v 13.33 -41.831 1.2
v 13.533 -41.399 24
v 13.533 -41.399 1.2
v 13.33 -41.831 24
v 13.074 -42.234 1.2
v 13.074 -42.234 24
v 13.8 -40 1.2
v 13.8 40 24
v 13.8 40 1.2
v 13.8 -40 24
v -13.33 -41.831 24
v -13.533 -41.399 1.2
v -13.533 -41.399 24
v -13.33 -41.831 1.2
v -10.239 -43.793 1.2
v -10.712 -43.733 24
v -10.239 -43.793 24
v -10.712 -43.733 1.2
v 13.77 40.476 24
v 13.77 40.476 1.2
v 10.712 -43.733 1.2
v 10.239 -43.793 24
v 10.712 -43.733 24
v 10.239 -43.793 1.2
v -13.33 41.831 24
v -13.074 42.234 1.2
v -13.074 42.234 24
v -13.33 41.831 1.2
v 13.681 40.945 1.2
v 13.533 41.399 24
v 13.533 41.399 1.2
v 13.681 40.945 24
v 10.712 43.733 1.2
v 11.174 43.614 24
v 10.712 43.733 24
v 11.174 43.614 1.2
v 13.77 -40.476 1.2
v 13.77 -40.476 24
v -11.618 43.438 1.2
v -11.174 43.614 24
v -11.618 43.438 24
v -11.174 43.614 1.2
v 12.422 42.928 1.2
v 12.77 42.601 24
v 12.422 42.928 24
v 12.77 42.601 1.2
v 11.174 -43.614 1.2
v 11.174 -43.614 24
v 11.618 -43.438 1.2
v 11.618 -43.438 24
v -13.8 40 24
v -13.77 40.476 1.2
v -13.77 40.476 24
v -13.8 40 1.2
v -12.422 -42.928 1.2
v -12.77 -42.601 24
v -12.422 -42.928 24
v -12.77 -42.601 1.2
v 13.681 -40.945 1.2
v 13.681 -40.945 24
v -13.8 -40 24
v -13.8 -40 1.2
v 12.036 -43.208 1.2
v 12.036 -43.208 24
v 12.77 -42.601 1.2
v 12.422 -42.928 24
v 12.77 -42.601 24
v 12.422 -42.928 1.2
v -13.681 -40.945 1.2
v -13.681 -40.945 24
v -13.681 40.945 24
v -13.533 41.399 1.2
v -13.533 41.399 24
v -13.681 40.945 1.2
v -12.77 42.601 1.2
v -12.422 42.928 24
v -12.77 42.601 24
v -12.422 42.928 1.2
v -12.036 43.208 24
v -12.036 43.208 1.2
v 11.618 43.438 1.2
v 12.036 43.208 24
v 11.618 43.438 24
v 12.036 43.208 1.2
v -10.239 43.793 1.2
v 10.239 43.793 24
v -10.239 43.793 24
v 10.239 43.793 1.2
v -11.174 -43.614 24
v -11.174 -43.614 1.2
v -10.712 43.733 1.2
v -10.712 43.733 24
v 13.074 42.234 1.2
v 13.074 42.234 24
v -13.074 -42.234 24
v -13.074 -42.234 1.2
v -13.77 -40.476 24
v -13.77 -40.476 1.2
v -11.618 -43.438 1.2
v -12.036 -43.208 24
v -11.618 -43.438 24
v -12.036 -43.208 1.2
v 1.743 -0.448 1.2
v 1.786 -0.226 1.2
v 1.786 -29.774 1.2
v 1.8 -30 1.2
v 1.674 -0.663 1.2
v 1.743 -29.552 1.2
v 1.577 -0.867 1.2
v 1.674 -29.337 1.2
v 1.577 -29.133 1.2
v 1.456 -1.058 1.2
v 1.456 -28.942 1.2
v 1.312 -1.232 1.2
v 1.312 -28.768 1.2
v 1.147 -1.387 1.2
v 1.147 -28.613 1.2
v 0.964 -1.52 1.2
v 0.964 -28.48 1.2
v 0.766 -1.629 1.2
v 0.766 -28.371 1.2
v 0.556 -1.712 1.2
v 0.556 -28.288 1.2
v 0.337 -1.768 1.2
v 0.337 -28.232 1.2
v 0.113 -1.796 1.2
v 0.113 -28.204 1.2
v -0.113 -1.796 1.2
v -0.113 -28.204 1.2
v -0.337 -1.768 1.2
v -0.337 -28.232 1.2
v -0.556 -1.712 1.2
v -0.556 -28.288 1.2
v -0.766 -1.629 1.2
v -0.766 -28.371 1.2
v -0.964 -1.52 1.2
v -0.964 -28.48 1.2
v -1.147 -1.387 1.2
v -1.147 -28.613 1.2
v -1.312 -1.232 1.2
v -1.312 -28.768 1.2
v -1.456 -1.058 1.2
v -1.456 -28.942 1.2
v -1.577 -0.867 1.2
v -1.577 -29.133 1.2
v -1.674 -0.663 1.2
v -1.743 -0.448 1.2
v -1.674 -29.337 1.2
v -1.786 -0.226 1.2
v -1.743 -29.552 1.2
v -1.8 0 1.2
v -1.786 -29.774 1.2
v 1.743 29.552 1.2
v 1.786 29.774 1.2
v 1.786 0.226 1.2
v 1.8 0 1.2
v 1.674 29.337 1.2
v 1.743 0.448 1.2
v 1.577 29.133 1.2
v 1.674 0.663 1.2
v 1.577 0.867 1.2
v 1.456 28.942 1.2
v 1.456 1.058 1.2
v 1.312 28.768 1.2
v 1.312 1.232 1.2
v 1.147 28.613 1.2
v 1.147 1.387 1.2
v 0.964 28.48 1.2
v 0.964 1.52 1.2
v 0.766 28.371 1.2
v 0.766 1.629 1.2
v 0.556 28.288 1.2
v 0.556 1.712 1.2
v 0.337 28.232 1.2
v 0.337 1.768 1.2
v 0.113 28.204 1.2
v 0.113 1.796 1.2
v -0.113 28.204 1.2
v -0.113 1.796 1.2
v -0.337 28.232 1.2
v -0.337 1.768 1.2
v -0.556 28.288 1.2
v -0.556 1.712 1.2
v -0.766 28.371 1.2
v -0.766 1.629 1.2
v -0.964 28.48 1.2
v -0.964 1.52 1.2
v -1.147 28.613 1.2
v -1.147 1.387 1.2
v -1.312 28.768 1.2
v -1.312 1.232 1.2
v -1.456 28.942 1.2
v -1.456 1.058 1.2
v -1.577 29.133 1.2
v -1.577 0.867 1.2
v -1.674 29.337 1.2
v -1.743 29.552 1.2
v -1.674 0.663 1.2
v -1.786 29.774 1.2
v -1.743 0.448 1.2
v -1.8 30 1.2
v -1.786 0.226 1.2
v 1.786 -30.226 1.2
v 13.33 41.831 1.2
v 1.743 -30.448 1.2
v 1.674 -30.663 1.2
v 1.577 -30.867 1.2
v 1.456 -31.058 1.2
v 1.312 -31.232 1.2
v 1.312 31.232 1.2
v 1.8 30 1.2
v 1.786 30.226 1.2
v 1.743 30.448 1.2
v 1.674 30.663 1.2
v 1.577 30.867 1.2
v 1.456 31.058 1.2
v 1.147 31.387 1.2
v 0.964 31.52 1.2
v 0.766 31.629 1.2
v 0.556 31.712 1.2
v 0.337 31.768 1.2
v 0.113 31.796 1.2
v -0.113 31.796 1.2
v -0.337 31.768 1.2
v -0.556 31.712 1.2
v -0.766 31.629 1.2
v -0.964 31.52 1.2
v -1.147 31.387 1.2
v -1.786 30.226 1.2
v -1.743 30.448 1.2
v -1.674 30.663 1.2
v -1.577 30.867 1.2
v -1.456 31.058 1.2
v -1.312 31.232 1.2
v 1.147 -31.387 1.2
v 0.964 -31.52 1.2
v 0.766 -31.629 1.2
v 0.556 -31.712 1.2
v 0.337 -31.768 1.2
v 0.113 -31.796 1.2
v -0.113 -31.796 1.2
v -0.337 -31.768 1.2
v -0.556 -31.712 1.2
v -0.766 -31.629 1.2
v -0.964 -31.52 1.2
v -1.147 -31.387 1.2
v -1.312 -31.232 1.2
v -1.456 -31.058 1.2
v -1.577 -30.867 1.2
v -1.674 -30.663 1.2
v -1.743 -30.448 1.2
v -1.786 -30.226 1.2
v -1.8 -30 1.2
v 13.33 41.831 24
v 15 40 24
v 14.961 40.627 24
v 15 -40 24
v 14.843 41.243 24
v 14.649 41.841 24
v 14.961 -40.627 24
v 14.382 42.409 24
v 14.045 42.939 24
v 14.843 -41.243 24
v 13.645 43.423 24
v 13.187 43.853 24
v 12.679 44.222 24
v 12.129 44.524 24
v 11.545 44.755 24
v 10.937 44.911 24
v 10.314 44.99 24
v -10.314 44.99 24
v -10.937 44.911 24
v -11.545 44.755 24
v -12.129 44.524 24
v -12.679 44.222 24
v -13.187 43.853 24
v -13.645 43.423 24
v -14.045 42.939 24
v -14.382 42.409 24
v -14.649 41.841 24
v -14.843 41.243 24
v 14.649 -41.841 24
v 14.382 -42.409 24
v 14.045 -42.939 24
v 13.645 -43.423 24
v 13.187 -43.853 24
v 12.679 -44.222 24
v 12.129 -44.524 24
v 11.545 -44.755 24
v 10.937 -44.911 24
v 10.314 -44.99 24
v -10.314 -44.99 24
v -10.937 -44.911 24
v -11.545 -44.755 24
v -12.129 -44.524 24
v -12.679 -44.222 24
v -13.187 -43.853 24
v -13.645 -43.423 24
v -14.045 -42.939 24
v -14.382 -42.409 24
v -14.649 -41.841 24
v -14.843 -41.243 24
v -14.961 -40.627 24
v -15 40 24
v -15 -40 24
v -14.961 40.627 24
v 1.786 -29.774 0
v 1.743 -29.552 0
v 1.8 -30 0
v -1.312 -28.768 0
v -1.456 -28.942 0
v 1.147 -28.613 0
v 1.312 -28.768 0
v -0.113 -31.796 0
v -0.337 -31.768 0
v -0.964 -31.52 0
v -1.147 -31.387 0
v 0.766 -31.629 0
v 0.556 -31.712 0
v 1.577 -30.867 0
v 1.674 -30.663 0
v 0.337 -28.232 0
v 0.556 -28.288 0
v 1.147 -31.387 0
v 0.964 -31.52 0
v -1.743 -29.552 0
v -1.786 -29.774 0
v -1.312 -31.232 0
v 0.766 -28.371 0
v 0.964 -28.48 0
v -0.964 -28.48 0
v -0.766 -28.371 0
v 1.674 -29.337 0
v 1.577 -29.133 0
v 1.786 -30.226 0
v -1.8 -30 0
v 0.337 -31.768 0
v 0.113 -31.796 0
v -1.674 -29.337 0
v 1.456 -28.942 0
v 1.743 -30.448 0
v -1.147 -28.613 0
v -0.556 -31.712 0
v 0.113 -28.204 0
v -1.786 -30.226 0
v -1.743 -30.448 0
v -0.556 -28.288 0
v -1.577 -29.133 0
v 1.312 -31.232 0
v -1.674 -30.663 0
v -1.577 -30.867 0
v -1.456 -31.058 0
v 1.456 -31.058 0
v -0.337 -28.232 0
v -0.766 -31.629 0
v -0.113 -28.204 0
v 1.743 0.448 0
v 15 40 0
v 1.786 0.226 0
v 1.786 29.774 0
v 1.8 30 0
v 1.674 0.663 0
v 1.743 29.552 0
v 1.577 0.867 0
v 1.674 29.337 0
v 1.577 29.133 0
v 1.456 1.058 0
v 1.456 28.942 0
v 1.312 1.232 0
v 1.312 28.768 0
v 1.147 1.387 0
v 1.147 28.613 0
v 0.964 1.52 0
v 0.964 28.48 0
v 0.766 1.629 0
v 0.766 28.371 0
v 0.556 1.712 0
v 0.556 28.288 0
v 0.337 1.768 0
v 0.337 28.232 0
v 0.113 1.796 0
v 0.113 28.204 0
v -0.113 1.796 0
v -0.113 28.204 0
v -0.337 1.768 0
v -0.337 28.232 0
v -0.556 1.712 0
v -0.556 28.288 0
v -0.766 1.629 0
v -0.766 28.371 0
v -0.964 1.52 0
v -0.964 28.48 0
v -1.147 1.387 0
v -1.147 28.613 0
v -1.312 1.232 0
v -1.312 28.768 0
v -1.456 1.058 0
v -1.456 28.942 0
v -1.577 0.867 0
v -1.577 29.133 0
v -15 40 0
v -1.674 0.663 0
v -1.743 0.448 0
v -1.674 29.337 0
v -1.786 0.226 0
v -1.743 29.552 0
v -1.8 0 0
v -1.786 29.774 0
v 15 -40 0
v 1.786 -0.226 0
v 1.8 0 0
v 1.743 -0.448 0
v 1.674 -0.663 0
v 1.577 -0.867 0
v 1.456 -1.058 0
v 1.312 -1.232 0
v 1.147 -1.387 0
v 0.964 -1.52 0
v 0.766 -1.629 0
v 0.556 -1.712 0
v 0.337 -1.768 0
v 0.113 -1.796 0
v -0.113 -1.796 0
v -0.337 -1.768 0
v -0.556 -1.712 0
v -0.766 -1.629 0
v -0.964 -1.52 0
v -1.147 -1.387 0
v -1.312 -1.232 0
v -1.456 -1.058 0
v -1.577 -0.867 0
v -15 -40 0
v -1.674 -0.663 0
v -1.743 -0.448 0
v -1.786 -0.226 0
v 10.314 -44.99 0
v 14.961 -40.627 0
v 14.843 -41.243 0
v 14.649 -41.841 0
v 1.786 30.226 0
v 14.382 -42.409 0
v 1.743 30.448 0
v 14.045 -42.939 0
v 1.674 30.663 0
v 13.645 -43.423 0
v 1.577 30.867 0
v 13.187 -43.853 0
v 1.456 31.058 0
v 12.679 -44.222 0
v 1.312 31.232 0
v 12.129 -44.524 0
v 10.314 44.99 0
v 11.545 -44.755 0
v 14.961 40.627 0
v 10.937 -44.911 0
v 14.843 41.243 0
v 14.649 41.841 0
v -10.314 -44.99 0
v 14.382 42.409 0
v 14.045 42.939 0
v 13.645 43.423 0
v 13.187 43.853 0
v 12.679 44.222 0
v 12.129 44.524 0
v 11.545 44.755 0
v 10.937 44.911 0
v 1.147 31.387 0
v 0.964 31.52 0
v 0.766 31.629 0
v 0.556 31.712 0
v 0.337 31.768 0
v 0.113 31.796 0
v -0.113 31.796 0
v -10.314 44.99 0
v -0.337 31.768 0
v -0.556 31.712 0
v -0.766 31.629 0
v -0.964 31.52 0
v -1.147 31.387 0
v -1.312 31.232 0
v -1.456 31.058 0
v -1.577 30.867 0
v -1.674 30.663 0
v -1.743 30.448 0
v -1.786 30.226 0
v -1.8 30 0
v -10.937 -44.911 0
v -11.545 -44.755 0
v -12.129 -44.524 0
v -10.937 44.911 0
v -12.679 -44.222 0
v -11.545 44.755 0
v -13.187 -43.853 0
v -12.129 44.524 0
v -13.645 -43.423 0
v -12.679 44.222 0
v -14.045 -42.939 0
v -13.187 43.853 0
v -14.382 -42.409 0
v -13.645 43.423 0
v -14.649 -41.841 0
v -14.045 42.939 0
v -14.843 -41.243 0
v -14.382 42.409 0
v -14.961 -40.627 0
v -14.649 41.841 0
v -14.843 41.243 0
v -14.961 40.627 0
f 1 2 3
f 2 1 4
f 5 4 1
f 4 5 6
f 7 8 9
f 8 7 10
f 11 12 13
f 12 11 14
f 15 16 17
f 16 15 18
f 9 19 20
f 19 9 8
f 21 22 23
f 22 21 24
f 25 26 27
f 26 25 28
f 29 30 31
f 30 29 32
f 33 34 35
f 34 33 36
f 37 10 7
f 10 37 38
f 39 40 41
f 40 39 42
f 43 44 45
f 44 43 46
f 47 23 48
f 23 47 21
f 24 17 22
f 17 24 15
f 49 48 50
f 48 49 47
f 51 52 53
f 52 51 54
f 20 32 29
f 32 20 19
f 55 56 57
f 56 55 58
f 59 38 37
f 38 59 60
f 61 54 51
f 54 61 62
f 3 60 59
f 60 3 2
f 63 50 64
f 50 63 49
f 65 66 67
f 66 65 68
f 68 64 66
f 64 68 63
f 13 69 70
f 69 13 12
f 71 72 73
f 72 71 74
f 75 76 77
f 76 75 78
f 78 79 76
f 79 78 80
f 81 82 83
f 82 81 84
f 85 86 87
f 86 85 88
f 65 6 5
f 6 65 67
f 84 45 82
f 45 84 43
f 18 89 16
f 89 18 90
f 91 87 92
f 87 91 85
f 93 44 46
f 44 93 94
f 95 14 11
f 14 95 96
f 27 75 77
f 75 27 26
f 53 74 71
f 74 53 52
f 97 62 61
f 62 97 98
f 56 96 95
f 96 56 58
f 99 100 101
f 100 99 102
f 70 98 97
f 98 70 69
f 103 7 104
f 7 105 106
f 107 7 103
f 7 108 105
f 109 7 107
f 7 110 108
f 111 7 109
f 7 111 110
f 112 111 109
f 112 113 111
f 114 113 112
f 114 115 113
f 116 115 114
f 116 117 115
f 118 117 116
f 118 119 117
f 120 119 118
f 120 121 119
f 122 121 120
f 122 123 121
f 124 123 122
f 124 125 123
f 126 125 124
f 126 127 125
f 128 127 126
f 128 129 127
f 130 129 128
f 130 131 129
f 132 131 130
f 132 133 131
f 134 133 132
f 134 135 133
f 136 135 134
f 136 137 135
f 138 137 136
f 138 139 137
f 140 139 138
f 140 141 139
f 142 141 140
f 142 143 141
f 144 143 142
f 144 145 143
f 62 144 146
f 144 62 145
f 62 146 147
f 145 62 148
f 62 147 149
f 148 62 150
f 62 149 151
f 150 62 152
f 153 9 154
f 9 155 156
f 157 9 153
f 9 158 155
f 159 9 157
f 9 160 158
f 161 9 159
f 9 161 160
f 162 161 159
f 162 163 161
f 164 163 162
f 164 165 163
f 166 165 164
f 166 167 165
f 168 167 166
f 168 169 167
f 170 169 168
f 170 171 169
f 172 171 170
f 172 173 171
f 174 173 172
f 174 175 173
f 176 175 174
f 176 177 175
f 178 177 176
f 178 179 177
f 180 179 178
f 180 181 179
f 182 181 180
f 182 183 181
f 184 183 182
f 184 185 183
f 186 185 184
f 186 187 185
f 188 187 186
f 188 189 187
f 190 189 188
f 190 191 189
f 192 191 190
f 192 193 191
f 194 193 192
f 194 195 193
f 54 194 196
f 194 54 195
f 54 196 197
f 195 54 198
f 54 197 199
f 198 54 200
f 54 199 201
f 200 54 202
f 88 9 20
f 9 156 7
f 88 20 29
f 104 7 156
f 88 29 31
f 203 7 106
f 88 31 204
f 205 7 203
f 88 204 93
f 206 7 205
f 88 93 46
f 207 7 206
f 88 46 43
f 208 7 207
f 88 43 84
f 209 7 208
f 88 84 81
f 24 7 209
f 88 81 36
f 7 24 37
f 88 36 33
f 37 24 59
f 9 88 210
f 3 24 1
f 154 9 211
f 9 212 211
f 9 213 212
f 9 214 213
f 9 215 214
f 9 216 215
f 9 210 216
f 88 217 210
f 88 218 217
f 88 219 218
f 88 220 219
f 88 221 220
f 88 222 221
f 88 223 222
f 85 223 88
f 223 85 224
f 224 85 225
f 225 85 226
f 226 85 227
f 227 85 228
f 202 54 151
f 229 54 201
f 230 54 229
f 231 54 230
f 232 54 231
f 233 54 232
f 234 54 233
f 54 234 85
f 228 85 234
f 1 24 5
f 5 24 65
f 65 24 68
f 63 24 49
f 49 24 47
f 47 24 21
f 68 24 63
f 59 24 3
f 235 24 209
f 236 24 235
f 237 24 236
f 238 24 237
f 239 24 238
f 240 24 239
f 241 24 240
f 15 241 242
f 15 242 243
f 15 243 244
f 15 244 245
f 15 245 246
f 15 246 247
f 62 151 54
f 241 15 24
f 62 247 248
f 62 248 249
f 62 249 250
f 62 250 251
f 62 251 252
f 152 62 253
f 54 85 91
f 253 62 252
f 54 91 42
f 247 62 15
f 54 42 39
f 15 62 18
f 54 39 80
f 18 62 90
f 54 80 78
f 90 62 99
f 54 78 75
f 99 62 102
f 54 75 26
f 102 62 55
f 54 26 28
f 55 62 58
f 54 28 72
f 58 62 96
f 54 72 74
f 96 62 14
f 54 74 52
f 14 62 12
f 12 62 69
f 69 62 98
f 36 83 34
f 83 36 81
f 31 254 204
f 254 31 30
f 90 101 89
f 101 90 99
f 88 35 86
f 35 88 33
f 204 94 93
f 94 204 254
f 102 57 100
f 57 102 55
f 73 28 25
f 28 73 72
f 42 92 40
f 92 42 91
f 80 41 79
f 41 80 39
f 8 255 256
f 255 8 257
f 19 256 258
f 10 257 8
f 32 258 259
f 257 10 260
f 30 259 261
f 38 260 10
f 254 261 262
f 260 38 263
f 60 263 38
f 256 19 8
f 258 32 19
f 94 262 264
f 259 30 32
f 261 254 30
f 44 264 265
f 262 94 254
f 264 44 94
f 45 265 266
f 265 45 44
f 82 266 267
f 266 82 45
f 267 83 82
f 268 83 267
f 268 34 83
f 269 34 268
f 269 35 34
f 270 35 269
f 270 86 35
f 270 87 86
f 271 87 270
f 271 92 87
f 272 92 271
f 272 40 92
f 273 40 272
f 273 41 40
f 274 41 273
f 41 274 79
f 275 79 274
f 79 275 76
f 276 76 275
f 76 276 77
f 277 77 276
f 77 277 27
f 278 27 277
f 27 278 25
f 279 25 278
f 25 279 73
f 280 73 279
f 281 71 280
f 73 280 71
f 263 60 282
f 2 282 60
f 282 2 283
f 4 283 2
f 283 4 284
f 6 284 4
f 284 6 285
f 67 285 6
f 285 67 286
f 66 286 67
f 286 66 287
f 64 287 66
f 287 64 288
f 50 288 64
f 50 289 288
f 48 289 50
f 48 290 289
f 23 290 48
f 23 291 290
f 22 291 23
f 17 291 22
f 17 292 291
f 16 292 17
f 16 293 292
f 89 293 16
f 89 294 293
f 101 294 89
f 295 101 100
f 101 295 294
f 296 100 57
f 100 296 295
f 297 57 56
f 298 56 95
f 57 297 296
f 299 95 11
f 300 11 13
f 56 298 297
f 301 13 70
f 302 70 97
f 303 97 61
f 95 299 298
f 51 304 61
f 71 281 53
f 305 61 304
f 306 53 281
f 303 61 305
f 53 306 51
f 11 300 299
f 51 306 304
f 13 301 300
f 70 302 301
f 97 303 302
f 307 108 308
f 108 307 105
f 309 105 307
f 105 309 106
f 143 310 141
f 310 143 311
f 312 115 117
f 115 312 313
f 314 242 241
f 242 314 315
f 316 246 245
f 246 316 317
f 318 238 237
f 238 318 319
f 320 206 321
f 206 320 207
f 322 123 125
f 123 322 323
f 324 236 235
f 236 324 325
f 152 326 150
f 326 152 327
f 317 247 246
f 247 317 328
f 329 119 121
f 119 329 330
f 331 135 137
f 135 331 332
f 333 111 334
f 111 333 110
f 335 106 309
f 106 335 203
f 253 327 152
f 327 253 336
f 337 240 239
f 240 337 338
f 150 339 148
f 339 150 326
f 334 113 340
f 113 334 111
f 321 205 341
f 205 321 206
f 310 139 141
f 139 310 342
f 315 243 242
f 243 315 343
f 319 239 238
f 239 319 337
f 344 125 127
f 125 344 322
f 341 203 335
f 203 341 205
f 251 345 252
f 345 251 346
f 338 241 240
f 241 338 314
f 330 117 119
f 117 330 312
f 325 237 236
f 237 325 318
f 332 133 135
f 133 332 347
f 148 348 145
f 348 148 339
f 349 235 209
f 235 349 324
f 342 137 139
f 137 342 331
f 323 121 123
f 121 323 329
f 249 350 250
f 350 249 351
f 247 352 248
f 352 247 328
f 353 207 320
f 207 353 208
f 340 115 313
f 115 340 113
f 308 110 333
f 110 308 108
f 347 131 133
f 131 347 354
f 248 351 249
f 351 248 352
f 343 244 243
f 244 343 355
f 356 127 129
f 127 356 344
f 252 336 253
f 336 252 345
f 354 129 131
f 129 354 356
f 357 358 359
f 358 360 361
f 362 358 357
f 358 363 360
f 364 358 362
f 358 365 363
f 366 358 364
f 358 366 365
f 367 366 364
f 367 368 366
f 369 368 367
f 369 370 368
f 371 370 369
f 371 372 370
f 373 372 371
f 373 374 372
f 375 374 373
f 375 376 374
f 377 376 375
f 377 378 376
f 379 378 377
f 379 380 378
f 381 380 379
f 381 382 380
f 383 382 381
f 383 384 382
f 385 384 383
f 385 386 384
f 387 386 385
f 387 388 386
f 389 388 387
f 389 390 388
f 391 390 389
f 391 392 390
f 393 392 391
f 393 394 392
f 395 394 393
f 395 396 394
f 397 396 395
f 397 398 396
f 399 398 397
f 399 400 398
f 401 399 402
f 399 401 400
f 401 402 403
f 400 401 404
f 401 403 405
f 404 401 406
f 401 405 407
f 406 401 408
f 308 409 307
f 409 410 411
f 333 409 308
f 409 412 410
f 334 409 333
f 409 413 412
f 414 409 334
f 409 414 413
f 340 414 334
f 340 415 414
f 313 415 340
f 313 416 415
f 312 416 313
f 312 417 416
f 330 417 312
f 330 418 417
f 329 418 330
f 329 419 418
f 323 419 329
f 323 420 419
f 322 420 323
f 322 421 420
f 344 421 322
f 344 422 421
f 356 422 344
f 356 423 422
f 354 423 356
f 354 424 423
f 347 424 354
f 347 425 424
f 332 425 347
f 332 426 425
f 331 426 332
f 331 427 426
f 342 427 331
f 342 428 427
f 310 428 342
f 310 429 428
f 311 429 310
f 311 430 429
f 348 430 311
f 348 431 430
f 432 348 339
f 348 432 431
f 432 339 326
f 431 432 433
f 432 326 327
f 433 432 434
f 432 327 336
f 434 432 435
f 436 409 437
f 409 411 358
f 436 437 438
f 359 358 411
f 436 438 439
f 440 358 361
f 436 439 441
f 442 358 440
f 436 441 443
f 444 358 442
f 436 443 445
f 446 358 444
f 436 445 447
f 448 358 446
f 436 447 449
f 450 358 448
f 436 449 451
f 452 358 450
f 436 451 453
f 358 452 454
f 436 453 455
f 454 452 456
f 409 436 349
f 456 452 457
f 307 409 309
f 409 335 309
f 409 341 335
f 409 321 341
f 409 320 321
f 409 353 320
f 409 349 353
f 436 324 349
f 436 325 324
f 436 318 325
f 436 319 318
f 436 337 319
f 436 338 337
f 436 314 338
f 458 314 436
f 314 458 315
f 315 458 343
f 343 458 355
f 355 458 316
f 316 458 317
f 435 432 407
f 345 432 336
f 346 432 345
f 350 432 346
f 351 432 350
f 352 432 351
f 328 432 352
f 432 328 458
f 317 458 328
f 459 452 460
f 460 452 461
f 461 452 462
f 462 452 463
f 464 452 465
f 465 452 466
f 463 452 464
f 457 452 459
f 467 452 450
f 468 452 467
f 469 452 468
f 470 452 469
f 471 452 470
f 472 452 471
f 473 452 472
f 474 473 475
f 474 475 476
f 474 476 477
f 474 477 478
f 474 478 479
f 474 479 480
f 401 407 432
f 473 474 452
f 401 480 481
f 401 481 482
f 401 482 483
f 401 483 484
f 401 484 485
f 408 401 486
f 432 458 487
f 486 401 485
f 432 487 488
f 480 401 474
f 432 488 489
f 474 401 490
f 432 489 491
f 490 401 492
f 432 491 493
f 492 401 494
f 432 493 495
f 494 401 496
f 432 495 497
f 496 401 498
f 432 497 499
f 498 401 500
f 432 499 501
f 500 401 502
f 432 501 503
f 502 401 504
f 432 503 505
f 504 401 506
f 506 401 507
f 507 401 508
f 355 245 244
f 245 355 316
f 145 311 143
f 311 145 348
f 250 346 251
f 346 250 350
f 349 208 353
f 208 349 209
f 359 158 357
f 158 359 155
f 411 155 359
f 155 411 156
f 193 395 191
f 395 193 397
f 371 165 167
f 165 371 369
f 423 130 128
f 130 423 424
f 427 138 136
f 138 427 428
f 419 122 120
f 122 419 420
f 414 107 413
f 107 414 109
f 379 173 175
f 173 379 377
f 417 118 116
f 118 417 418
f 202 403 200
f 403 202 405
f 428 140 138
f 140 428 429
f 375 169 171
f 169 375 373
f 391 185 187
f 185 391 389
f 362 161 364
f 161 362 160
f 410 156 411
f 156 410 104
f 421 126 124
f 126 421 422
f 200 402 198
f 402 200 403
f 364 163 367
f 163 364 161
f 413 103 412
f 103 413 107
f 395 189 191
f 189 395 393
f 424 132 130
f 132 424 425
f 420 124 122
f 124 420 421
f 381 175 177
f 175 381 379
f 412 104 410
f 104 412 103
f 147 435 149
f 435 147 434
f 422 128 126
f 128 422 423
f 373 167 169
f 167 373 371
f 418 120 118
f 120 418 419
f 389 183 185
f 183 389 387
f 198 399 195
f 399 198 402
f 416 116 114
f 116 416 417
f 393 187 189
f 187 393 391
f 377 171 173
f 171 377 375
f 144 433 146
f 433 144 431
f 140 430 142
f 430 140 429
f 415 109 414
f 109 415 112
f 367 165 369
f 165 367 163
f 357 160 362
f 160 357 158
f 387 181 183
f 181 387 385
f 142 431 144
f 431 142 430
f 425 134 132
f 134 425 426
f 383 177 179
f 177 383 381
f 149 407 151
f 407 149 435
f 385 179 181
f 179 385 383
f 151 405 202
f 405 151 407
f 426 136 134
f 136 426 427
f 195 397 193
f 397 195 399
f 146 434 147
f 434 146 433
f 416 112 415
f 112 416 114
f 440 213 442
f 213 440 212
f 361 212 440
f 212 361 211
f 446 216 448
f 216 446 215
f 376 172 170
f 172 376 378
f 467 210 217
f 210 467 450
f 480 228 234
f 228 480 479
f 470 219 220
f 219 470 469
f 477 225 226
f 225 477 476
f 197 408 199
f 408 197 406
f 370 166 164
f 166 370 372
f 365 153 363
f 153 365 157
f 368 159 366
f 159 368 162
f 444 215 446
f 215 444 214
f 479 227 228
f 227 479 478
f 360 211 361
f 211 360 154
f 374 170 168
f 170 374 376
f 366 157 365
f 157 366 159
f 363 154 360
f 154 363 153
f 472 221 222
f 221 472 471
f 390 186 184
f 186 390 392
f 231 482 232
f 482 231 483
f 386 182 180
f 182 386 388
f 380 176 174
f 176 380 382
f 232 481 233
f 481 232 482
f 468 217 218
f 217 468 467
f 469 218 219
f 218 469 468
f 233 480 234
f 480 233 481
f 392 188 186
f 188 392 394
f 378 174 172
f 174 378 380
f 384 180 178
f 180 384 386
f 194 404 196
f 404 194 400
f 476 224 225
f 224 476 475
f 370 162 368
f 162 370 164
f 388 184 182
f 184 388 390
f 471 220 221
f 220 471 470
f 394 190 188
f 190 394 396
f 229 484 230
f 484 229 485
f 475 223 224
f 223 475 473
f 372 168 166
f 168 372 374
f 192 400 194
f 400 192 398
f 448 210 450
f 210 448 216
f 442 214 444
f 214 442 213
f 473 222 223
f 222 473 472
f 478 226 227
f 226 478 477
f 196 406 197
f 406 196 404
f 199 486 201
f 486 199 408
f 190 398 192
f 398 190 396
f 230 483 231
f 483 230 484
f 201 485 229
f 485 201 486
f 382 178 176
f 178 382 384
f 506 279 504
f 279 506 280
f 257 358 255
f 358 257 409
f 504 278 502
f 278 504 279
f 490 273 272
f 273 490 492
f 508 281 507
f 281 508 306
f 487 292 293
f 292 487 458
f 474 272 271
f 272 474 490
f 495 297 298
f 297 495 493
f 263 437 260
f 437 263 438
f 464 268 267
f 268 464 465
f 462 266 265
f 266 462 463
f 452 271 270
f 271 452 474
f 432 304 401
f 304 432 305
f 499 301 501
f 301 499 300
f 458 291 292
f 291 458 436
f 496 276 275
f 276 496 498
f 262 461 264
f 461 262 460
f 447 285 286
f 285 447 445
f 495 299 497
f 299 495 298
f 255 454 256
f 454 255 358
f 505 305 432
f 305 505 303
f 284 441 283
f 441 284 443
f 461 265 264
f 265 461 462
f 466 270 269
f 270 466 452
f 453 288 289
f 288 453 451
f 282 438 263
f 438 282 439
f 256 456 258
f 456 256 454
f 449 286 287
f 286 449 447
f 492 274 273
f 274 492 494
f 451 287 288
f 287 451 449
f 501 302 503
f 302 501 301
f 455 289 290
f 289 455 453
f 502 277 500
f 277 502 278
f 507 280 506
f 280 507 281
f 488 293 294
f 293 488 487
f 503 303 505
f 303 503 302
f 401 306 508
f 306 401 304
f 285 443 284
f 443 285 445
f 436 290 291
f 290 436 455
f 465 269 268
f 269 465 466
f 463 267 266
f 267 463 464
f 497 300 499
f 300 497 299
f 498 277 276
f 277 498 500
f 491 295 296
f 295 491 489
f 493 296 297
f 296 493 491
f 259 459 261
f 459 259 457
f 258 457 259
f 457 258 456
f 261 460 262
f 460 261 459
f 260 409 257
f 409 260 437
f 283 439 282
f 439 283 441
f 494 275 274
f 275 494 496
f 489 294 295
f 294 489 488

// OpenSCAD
$fn = 50;


difference() {
	union() {
		hull() {
			translate(v = [-10.0000000000, 40.0000000000, 0]) {
				cylinder(h = 24, r = 5);
			}
			translate(v = [10.0000000000, 40.0000000000, 0]) {
				cylinder(h = 24, r = 5);
			}
			translate(v = [-10.0000000000, -40.0000000000, 0]) {
				cylinder(h = 24, r = 5);
			}
			translate(v = [10.0000000000, -40.0000000000, 0]) {
				cylinder(h = 24, r = 5);
			}
		}
	}
	union() {
		translate(v = [0, 0, 1.2000000000]) {
			hull() {
				translate(v = [-10.0000000000, 40.0000000000, 0]) {
					cylinder(h = 22.8000000000, r = 3.8000000000);
				}
				translate(v = [10.0000000000, 40.0000000000, 0]) {
					cylinder(h = 22.8000000000, r = 3.8000000000);
				}
				translate(v = [-10.0000000000, -40.0000000000, 0]) {
					cylinder(h = 22.8000000000, r = 3.8000000000);
				}
				translate(v = [10.0000000000, -40.0000000000, 0]) {
					cylinder(h = 22.8000000000, r = 3.8000000000);
				}
			}
		}
		#translate(v = [0.0000000000, -30.0000000000, 0]) {
			cylinder(h = 1.2000000000, r = 1.8000000000);
		}
		#cylinder(h = 1.2000000000, r = 1.8000000000);
		#translate(v = [0.0000000000, 30.0000000000, 0]) {
			cylinder(h = 1.2000000000, r = 1.8000000000);
		}
	}
}
